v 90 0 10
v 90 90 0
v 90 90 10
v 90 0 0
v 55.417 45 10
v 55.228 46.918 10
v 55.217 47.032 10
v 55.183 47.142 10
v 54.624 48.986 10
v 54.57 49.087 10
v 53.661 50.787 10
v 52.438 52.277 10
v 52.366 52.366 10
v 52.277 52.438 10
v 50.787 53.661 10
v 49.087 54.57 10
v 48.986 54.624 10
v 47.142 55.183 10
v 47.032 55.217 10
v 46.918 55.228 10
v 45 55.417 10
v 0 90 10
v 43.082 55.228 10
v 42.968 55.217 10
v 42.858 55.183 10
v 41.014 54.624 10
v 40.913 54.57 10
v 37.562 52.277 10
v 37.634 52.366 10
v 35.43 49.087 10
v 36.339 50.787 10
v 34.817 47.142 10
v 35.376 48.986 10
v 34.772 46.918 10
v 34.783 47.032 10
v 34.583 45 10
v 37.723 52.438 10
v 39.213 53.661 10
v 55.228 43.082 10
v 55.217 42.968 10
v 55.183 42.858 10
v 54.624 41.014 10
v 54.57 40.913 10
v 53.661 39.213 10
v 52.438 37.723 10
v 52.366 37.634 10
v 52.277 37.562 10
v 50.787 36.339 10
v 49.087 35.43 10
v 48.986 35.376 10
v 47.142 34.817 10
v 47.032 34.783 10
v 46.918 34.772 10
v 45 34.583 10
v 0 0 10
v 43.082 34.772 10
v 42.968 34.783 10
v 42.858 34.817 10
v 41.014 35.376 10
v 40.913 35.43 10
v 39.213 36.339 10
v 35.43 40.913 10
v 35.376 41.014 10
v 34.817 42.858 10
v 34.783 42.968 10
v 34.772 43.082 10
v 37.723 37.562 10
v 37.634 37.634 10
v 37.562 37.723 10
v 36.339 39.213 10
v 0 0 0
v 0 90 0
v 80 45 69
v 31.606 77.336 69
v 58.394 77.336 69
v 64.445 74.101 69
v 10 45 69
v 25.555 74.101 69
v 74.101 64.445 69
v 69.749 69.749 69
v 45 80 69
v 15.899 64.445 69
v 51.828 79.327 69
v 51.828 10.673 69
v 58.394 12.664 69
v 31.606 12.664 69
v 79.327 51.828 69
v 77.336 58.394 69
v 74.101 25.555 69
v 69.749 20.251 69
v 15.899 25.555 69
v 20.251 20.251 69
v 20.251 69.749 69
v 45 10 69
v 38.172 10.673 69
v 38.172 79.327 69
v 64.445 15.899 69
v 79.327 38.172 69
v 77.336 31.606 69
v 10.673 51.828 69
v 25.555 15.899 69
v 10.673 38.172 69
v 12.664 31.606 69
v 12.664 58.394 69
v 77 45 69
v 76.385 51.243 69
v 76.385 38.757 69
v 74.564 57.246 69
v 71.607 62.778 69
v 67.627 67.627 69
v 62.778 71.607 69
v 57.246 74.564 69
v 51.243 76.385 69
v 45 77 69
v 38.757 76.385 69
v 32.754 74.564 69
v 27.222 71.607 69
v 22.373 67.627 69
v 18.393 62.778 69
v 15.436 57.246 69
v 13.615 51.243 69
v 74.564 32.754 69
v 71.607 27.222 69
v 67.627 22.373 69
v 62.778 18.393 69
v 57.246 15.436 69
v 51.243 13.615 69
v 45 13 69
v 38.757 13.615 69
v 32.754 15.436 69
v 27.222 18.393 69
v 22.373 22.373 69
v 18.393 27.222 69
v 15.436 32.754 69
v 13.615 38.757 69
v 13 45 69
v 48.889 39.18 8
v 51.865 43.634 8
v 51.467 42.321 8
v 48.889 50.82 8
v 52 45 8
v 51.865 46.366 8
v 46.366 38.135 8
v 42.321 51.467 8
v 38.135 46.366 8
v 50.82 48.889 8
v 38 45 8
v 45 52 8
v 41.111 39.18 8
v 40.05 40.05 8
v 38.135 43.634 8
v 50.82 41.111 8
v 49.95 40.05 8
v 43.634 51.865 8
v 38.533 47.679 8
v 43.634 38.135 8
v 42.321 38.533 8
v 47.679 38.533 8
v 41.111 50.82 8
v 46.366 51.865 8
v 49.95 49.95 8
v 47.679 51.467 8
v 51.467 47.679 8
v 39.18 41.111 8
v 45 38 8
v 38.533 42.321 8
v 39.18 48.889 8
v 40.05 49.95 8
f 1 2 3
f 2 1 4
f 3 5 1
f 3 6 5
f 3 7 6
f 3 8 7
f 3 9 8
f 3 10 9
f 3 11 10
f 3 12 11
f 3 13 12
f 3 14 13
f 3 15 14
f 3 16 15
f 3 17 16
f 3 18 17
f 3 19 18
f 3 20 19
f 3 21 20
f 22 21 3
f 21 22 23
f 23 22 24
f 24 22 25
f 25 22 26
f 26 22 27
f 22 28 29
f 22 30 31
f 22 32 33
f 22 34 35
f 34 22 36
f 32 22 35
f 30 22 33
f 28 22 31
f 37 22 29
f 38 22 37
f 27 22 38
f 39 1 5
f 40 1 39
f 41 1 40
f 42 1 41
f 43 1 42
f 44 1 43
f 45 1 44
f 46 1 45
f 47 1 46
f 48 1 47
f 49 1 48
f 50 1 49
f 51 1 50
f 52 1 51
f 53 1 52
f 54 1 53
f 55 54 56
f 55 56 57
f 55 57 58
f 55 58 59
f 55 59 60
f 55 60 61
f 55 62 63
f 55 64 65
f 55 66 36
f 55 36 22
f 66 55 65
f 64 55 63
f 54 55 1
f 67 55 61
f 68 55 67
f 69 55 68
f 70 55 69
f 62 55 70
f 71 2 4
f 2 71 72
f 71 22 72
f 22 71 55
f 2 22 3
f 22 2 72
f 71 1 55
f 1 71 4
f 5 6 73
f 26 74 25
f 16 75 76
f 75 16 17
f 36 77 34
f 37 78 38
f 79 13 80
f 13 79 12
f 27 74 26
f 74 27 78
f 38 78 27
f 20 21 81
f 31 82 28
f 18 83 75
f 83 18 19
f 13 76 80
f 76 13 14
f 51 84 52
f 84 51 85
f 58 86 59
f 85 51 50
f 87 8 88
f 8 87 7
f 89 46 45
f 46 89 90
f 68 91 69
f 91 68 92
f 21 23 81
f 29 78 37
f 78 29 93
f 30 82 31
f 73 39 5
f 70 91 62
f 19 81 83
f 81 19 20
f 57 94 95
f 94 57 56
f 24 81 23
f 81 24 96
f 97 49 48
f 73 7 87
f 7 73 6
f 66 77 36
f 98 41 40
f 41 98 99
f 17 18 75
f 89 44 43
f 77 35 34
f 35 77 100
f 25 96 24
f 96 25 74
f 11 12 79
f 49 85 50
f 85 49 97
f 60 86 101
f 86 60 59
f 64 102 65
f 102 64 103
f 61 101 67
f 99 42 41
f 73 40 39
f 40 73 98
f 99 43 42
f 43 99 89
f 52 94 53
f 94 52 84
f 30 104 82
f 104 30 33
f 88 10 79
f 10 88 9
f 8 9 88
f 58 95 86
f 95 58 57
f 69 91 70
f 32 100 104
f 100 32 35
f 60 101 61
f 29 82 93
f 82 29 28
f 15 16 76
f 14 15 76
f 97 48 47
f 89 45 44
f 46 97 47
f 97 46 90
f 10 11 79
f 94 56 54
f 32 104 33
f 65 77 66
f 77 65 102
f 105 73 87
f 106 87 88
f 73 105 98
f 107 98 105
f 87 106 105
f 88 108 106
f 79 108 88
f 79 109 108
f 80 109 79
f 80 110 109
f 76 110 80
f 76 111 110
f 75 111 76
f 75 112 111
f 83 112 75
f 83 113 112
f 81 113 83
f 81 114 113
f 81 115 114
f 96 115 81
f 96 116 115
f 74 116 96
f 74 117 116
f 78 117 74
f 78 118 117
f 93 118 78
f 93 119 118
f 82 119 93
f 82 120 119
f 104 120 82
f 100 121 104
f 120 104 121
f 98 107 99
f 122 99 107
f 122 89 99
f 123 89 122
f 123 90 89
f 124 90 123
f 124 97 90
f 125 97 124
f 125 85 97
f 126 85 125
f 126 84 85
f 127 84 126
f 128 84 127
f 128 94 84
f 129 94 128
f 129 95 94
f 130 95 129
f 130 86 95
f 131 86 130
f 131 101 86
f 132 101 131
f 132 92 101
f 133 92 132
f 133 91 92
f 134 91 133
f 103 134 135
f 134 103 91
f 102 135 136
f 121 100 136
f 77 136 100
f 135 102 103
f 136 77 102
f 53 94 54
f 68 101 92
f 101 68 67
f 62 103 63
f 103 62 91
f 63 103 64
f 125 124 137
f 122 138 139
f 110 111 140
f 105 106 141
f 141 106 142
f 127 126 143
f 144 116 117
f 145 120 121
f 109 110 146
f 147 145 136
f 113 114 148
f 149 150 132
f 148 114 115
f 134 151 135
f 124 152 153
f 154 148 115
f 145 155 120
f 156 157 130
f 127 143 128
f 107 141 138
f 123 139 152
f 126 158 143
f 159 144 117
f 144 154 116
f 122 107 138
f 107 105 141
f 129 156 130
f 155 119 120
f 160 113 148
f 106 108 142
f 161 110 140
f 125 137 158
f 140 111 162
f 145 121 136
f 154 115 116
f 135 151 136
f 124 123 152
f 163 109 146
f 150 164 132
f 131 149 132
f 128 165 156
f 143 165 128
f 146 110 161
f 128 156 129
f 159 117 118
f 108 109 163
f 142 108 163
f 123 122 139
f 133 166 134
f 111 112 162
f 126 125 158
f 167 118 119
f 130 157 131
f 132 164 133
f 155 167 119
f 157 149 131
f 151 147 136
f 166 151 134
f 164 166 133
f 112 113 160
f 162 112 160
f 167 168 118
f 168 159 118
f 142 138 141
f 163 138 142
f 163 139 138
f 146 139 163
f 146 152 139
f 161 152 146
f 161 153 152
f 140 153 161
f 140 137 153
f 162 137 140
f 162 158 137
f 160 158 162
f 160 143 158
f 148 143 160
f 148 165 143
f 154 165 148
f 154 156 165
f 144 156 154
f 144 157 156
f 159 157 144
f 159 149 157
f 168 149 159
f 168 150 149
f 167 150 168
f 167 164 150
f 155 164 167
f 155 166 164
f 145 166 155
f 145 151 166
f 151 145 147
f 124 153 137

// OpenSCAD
$fn = 32;

// ----------------------------------------------------------------------
// Hopper: funnel with square flange
// ----------------------------------------------------------------------

// --- parameters (mm) ---
fl = 90;                  // flange side, X and Y
fl_t = 10;                // flange thickness
cone_h = 60;              // cone height above the flange
top_d = 70;               // cone mouth diameter
bot_d = 20;               // cone spout diameter
wall = 3;                 // cone wall thickness

bore_d = bot_d - 2 * wall;  // spout bore diameter
total_h = fl_t + cone_h - 1;  // overall height

difference() {
  union() {
    cube([fl, fl, fl_t]);
    translate([fl / 2, fl / 2, fl_t - 1])
      cylinder(h = cone_h, d1 = bot_d, d2 = top_d);
  }
  translate([fl / 2, fl / 2, fl_t - 2])
    cylinder(h = cone_h + 1, d1 = bore_d, d2 = top_d - 2 * wall);
}
